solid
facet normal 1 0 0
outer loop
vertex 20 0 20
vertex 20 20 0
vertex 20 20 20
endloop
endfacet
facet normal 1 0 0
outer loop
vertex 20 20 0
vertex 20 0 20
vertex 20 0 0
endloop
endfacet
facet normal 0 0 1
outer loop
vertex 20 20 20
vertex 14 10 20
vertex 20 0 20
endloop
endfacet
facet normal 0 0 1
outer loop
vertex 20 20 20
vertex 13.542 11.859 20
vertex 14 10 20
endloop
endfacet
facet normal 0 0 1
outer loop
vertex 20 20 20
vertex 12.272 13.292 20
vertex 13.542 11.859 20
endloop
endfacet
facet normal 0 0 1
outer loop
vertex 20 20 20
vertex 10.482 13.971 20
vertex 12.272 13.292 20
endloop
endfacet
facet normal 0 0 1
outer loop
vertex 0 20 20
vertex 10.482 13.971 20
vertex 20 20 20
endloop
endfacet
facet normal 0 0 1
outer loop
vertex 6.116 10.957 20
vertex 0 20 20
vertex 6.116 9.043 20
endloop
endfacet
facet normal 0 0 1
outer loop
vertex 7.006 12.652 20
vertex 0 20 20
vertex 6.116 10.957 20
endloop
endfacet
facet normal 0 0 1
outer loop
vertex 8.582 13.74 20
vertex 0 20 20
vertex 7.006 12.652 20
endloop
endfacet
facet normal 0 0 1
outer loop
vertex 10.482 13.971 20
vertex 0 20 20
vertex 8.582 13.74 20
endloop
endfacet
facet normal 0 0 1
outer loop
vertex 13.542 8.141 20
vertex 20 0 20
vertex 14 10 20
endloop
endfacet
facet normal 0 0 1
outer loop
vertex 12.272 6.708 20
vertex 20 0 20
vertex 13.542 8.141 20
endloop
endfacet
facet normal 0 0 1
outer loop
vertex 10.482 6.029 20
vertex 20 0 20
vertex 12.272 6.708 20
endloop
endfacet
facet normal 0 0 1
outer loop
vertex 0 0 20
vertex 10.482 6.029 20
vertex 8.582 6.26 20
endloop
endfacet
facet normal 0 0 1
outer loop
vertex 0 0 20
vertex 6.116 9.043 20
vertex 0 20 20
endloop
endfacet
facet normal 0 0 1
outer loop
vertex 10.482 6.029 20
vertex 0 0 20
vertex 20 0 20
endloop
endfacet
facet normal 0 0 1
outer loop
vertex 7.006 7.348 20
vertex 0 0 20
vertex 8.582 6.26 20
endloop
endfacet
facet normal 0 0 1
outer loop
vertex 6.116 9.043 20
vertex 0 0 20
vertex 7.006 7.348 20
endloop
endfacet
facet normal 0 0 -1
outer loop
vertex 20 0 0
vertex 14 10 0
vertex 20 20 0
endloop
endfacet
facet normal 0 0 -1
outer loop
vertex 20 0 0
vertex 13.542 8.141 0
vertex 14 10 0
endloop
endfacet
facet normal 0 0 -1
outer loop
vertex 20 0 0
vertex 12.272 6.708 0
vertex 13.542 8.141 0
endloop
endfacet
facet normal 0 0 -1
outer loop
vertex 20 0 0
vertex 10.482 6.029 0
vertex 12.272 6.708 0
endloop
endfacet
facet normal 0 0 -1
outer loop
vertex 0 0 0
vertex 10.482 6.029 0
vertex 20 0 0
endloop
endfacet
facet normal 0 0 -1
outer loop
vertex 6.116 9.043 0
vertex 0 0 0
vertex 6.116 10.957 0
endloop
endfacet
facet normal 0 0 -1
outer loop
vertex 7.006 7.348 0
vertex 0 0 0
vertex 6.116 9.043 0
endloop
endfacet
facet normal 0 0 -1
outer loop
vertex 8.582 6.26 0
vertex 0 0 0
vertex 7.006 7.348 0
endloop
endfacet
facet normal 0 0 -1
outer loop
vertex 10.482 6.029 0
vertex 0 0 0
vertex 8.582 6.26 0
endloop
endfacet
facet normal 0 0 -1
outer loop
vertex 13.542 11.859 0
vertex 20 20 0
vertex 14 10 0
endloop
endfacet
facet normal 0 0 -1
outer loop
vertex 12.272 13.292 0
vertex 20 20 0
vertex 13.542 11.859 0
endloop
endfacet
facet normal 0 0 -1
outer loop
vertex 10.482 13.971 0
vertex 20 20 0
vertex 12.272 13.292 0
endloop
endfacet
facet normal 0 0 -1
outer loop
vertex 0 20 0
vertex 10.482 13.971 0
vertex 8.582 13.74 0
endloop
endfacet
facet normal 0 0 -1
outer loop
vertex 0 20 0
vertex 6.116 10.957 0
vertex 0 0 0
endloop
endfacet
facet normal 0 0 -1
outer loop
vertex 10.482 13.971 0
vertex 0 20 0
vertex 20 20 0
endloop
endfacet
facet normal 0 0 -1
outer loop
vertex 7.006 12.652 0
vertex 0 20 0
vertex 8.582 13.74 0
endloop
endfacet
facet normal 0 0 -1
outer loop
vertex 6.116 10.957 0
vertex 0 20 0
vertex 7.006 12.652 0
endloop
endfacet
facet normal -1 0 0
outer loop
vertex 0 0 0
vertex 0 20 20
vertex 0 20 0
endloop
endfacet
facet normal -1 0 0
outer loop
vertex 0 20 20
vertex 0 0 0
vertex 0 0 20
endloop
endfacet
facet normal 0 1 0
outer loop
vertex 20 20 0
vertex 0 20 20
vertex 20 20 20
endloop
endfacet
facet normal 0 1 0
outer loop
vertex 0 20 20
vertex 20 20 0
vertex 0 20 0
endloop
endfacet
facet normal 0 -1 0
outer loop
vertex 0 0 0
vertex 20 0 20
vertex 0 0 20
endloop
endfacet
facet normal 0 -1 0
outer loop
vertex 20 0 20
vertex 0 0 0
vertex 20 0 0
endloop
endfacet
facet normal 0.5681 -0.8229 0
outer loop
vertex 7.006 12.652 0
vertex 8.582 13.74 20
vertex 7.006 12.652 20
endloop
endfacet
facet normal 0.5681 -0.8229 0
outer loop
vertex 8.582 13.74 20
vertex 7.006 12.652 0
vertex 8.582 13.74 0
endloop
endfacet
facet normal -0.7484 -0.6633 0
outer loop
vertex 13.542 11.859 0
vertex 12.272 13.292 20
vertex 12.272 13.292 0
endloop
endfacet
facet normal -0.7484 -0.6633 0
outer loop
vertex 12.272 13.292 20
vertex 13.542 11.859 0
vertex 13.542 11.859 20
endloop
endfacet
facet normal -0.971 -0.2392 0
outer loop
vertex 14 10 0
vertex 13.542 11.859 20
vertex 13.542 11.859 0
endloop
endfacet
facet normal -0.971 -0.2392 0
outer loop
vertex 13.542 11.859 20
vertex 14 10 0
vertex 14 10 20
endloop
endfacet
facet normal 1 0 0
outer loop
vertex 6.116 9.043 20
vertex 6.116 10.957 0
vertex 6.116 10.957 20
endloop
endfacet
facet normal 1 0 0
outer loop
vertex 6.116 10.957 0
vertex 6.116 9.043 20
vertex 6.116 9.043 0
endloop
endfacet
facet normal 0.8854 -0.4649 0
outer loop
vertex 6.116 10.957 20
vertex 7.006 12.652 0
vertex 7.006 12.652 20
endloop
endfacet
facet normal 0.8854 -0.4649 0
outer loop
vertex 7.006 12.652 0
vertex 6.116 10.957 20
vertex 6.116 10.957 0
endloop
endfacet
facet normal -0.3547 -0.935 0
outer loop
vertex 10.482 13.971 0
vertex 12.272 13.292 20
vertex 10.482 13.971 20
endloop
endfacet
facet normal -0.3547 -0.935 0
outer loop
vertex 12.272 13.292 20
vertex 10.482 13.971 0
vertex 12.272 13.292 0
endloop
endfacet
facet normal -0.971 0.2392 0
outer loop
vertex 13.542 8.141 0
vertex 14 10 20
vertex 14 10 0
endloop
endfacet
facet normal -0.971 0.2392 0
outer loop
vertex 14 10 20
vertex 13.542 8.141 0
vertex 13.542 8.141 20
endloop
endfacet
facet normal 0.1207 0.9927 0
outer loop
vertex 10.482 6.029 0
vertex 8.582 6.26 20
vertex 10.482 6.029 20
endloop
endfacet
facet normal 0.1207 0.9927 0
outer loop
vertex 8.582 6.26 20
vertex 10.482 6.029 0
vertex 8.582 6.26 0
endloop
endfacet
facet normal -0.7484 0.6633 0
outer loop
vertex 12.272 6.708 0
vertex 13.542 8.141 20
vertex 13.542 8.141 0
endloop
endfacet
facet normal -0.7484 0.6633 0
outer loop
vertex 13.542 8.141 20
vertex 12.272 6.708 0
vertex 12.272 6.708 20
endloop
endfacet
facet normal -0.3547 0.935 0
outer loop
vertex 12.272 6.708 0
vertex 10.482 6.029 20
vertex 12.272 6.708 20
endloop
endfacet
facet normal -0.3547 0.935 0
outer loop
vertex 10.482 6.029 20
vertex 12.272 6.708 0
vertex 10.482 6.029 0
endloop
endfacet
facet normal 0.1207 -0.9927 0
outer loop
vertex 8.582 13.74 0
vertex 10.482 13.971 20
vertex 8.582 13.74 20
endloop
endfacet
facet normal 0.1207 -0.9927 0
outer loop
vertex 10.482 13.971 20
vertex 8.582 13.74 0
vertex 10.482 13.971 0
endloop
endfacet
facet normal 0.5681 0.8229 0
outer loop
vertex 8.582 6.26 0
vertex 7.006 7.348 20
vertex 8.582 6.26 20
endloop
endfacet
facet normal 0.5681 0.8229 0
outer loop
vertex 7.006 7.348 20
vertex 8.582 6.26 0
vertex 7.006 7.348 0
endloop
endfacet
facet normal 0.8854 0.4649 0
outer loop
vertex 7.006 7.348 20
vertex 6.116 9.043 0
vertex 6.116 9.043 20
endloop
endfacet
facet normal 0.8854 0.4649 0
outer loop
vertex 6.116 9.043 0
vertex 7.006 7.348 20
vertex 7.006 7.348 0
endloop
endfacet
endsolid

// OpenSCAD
color("red") difference(fillet = 1) { cube(20); color("blue") translate([10, 10, -1]) cylinder(h = 22, r = 4); }
